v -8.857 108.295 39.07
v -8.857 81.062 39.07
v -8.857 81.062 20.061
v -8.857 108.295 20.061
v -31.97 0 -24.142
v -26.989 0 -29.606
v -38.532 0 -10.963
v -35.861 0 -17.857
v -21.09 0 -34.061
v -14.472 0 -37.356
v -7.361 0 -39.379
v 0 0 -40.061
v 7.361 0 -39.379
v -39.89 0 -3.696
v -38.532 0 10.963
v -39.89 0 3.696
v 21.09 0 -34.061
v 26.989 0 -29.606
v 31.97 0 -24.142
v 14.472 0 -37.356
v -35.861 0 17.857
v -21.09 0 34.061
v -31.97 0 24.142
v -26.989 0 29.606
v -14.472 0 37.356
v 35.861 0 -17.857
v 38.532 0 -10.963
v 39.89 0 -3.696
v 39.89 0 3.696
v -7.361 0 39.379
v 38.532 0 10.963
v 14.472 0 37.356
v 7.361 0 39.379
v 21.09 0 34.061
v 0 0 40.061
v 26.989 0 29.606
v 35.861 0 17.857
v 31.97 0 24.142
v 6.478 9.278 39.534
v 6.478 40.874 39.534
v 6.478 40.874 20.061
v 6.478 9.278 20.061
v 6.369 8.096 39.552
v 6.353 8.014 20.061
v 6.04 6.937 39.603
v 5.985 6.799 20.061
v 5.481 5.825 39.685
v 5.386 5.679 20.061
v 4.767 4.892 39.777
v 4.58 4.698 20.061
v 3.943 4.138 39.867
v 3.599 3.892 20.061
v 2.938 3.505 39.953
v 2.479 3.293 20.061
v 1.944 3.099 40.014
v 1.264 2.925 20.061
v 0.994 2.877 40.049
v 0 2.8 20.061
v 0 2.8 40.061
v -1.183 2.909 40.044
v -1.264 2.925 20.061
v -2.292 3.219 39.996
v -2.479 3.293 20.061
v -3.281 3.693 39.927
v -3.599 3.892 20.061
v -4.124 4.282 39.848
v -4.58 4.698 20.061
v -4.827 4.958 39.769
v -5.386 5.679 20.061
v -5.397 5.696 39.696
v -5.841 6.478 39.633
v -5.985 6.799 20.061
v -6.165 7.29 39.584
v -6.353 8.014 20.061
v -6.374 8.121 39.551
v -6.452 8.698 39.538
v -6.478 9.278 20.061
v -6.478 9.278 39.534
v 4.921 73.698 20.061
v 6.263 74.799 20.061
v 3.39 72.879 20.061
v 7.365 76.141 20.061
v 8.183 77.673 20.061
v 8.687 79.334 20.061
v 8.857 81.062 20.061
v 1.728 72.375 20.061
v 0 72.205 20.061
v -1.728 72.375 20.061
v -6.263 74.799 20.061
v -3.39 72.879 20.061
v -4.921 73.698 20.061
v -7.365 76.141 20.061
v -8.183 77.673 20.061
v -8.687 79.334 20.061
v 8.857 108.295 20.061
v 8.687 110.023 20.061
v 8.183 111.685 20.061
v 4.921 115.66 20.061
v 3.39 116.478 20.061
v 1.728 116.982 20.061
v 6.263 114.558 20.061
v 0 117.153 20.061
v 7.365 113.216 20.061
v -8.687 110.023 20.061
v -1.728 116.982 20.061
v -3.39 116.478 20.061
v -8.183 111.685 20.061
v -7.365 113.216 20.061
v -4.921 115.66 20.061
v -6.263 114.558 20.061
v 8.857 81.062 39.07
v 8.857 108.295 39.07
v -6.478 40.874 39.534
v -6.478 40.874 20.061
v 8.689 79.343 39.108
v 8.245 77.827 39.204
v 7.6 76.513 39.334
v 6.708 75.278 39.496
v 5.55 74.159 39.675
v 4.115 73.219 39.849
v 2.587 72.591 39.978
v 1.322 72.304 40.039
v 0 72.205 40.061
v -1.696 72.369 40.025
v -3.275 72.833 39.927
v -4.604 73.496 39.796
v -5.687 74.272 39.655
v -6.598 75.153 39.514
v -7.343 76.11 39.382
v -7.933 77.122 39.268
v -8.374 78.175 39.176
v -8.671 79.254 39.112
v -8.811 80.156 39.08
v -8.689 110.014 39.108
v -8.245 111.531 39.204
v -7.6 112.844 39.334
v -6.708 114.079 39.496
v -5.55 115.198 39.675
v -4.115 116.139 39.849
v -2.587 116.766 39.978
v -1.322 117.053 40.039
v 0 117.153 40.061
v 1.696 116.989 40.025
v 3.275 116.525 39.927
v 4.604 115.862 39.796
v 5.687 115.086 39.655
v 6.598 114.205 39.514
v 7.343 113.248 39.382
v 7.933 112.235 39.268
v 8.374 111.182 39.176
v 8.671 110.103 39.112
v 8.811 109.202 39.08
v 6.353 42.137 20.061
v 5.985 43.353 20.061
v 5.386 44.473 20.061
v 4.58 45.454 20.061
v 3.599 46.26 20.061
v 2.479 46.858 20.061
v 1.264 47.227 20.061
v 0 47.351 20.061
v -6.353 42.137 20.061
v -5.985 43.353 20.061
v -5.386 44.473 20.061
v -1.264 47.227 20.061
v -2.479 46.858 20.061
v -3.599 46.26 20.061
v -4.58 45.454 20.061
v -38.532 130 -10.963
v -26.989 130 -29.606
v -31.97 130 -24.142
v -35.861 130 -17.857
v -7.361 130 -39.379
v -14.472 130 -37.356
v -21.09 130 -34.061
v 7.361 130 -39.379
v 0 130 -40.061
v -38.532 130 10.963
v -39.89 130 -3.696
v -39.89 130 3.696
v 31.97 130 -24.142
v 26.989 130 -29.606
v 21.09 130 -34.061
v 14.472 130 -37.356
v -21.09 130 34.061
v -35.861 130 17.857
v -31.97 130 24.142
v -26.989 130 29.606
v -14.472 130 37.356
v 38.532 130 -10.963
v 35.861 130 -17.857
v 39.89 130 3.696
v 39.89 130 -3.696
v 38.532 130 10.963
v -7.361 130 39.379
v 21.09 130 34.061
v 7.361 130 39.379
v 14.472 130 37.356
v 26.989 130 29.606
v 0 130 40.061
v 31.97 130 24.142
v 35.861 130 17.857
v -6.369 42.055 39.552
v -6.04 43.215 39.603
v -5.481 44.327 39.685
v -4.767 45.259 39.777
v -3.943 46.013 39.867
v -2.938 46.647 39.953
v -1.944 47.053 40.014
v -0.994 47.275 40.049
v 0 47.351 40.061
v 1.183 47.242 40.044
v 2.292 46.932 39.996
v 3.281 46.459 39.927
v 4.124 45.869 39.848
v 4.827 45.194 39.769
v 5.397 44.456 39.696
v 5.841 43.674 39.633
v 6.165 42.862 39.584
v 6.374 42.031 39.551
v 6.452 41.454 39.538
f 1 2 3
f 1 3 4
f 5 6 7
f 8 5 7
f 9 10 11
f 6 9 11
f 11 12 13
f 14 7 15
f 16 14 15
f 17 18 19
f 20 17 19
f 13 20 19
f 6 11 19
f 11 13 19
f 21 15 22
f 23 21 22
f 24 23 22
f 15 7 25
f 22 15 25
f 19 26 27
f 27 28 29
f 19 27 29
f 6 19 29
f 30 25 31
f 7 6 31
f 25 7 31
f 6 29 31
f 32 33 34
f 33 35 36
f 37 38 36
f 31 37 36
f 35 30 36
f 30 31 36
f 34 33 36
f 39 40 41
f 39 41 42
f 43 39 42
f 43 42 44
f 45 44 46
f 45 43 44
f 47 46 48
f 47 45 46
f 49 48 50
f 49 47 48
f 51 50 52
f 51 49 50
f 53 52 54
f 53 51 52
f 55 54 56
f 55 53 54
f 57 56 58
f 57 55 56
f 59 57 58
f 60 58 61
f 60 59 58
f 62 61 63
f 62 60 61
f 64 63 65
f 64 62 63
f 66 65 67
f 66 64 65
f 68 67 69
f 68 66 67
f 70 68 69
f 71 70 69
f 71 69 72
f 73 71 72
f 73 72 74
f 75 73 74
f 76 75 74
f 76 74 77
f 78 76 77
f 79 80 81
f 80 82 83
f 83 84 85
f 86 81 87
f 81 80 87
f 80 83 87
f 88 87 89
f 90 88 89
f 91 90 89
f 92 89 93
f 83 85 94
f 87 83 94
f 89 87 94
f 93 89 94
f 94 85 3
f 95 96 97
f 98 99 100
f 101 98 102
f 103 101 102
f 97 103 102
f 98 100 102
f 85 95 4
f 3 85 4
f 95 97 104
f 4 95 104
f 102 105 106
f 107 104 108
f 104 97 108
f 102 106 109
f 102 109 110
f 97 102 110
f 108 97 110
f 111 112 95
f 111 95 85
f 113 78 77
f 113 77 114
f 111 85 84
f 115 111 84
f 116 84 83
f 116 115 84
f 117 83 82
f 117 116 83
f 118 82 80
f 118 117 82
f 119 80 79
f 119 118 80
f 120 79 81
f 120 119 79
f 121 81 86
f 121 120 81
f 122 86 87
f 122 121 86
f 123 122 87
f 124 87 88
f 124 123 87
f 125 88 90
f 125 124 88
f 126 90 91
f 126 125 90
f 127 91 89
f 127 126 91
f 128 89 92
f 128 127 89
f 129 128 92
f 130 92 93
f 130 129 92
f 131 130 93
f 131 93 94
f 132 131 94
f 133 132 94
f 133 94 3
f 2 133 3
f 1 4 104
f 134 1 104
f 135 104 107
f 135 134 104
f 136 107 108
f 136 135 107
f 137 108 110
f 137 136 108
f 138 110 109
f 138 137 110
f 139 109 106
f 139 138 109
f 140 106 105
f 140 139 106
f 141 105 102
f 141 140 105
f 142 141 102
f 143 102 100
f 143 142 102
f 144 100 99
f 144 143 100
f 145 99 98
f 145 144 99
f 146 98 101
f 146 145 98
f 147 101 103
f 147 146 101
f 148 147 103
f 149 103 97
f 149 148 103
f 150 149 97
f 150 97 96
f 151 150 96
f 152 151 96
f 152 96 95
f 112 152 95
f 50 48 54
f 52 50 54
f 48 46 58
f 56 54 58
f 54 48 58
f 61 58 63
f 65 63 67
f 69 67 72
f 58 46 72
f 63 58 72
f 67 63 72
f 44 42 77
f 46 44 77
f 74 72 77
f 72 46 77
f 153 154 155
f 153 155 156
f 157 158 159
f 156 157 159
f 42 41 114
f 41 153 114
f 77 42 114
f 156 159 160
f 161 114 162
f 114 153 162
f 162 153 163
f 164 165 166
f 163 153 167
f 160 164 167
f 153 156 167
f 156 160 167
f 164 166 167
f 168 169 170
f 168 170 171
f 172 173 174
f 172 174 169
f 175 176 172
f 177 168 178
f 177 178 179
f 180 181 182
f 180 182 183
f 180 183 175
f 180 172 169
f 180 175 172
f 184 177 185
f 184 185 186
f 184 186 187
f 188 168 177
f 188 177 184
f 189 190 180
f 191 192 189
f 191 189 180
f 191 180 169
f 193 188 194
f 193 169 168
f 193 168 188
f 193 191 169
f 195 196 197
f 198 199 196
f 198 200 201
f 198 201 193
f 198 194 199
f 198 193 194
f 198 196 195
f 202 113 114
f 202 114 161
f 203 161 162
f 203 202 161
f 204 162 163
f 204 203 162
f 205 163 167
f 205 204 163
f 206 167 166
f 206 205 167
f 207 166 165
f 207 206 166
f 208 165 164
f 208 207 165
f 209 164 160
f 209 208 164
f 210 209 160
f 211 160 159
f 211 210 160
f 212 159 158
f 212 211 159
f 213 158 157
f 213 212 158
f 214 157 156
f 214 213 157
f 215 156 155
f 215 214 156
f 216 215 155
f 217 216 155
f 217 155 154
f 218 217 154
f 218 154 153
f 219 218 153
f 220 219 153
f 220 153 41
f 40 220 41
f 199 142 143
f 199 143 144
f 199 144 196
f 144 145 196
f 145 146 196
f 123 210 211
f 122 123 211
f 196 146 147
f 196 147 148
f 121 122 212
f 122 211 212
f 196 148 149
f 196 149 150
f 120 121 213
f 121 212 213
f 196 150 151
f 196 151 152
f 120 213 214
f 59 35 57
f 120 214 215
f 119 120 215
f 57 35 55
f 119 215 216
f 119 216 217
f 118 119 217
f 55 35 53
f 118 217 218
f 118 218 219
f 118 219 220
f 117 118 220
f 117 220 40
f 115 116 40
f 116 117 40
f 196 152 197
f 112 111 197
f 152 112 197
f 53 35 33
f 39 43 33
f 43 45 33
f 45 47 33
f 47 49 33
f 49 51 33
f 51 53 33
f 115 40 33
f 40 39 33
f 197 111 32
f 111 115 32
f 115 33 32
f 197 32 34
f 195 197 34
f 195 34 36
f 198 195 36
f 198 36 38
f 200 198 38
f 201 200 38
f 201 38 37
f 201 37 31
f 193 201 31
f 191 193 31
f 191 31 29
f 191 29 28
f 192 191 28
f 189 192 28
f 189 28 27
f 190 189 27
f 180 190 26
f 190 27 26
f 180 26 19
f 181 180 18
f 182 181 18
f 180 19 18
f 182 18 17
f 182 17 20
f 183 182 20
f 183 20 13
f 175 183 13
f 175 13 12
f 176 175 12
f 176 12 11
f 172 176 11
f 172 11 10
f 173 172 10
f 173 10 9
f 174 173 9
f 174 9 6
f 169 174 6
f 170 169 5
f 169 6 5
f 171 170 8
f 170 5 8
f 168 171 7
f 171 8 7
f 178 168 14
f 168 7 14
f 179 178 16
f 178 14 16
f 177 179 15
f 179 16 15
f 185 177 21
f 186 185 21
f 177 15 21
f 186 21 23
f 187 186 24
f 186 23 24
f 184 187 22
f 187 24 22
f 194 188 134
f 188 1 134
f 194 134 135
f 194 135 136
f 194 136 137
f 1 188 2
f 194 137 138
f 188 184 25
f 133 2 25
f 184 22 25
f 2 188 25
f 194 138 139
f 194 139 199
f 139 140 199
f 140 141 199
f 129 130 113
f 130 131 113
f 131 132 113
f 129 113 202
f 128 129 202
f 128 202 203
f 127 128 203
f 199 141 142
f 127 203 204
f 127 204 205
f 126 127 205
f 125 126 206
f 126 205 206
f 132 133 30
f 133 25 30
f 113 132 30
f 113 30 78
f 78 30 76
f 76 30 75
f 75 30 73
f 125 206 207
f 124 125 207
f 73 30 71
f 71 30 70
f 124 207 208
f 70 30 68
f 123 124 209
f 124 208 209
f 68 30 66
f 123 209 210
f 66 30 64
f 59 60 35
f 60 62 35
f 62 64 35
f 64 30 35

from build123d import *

# Parameters (mm, degrees)
SKETCH_1_R          = 40.061210901
EXTRUDE_1_DEPTH     = 130
CUT_EXTRUDE_1_DEPTH = 20


with BuildPart() as part:
    # 草图1 → 凸台-拉伸1 (new body)
    with BuildSketch(Plane(origin=(0, 0, 0), x_dir=(1, 0, 0), z_dir=(0, 1, 0))):
        with Locations(Location((0, 0, 0), (0, 0, 270))):
            Circle(SKETCH_1_R)
    extrude(amount=EXTRUDE_1_DEPTH)

    # 草图2 → 切除-拉伸1 (cut)
    with BuildSketch(Plane.XY.offset(40.061210901)):
        with BuildLine():
            Line((8.857338492, 108.295199344), (8.857338492, 81.062188459))
            ThreePointArc((8.857338492, 81.062188459), (0, 72.204849967), (-8.857338492, 81.062188459))
            Line((-8.857338492, 81.062188459), (-8.857338492, 108.295199344))
            ThreePointArc((-8.857338492, 108.295199344), (0, 117.152537836), (8.857338492, 108.295199344))
        make_face()
        with BuildLine():
            Line((6.477755016, 40.873667541), (6.477755016, 9.278086951))
            ThreePointArc((6.477755016, 9.278086951), (0, 2.800331935), (-6.477755016, 9.278086951))
            Line((-6.477755016, 9.278086951), (-6.477755016, 40.873667541))
            ThreePointArc((-6.477755016, 40.873667541), (0, 47.351422558), (6.477755016, 40.873667541))
        make_face()
    extrude(amount=-CUT_EXTRUDE_1_DEPTH, mode=Mode.SUBTRACT)


solid = part.part
